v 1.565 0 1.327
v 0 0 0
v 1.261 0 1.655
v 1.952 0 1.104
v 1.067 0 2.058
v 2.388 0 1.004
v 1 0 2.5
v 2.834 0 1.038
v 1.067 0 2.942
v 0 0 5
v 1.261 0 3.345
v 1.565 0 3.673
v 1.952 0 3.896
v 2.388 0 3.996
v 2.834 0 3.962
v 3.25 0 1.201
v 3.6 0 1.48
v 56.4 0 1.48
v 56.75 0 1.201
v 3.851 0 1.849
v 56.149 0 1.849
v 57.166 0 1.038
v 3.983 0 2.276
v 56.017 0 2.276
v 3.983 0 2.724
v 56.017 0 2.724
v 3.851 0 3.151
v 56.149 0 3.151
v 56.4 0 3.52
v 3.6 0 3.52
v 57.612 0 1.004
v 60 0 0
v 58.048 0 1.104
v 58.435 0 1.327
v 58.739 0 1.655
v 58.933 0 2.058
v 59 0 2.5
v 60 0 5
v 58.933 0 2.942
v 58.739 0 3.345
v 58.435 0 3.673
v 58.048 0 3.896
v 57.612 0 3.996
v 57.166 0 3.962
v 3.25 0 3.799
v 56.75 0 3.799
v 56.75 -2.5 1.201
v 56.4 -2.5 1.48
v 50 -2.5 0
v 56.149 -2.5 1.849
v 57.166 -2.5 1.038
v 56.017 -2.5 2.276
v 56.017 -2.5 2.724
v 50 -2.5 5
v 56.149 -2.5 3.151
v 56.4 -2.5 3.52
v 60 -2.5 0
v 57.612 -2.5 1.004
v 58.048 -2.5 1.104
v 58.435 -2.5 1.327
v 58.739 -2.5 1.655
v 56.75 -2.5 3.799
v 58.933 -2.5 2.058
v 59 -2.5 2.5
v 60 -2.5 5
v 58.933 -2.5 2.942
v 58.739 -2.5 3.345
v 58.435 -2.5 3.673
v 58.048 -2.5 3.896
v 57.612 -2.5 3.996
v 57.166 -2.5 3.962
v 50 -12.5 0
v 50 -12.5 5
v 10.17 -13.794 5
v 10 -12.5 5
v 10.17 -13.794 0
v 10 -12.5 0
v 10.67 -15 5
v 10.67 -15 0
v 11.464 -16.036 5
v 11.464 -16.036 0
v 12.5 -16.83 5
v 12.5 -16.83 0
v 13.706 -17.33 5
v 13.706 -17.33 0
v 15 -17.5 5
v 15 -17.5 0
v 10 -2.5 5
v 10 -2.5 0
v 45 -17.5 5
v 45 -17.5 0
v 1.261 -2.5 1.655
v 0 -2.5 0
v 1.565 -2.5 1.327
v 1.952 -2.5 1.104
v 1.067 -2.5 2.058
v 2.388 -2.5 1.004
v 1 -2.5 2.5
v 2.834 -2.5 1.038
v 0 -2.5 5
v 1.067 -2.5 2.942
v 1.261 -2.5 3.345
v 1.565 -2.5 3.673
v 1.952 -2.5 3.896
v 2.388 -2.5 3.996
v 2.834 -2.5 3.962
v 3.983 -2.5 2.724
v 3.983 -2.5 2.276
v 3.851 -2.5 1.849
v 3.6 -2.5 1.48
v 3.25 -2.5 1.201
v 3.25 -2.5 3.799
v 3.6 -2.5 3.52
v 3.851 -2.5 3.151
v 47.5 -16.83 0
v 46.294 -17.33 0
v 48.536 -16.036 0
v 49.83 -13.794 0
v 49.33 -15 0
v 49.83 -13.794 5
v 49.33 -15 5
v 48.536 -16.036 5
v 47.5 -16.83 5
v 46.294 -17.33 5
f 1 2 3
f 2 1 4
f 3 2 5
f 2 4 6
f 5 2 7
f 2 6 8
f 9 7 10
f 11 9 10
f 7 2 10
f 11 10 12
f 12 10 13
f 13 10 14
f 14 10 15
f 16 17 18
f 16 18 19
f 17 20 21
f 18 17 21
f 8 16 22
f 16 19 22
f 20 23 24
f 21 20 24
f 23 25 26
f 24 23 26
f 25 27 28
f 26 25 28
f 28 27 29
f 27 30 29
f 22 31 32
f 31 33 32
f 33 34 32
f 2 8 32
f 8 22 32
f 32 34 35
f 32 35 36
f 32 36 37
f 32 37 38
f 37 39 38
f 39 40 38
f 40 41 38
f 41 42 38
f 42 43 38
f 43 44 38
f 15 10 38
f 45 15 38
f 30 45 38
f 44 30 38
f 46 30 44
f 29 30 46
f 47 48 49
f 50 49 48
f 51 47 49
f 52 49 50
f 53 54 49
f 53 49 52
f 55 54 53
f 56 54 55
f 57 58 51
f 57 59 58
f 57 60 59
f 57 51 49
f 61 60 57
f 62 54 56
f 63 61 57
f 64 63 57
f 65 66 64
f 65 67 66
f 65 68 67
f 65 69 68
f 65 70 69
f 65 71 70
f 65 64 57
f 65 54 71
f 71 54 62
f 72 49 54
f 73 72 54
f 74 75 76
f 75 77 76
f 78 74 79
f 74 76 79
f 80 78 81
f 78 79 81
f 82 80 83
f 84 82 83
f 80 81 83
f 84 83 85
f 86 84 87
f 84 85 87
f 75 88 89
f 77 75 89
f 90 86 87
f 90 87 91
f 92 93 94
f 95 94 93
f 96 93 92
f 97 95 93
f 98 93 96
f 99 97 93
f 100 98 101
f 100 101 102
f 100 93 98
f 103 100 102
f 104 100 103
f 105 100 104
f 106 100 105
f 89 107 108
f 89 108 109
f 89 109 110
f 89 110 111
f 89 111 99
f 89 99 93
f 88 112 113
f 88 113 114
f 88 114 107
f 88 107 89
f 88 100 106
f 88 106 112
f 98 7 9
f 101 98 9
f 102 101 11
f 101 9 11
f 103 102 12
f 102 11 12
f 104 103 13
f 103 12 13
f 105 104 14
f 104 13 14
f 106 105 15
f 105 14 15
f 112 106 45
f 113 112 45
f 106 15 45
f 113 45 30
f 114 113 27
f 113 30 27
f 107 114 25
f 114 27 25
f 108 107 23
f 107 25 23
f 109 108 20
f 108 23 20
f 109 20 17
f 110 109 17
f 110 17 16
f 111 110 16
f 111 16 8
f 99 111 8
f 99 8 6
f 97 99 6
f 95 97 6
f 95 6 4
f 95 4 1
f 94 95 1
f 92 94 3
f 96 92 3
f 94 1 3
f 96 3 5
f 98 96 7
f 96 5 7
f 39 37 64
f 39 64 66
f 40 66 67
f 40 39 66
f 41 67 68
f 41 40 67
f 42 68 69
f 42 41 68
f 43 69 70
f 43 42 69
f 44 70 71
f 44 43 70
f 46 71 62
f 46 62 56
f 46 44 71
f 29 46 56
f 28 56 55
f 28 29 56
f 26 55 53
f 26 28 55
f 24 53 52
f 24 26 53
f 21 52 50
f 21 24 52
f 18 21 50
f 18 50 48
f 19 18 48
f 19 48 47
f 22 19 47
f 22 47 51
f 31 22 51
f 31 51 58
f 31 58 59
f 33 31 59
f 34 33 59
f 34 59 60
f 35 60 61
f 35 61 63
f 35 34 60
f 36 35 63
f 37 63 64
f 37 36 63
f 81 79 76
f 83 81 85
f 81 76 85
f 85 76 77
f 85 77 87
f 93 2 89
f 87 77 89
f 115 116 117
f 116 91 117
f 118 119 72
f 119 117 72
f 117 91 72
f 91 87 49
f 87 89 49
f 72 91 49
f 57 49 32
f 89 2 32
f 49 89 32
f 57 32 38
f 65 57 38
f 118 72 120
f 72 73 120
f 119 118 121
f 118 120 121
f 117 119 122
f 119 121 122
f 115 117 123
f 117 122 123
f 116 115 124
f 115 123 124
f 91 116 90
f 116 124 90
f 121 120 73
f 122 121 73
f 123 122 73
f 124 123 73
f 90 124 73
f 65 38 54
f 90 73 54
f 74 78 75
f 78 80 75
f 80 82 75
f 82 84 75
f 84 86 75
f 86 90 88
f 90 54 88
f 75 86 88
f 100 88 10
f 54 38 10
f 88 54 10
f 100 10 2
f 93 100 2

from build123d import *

# Parameters (mm, degrees)
F0_R     = 1.5
F1_DEPTH = 2.5
F3_DEPTH = 15
F4_R     = 5


with BuildPart() as f1:
    # F0 (on Front) → F1 (new body)
    with BuildSketch(Plane.XZ):
        with Locations((57.5, 2.5)):
            Circle(F0_R)
        with BuildLine():
            ThreePointArc((4, 2.5), (2.5, 4), (1, 2.5))
            ThreePointArc((1, 2.5), (2.5, 1), (4, 2.5))
        make_face()
        Polygon((0, 2.5), (0, 0), (60, 0), (60, 2.5), (60, 5), (0, 5), align=None)
        with BuildLine():
            ThreePointArc((4, 2.5), (2.5, 1), (1, 2.5))
            ThreePointArc((1, 2.5), (2.5, 4), (4, 2.5))
        make_face(mode=Mode.SUBTRACT)
        with Locations((57.5, 2.5)):
            Circle(F0_R, mode=Mode.SUBTRACT)
    extrude(amount=F1_DEPTH)

    # F2 (on face) → F3 (join)
    with BuildSketch(Plane.XZ.offset(2.5)):
        Polygon((50, 5), (30, 5), (10, 5), (10, 0), (50, 0), align=None)
    extrude(amount=F3_DEPTH)

    # F4
    f4_edges = [f1.edges().sort_by_distance(p)[0] for p in [
        (10, -17.5, 2.5),
        (50, -17.5, 2.5),
    ]]
    fillet(f4_edges, radius=F4_R)


solid = f1.part
